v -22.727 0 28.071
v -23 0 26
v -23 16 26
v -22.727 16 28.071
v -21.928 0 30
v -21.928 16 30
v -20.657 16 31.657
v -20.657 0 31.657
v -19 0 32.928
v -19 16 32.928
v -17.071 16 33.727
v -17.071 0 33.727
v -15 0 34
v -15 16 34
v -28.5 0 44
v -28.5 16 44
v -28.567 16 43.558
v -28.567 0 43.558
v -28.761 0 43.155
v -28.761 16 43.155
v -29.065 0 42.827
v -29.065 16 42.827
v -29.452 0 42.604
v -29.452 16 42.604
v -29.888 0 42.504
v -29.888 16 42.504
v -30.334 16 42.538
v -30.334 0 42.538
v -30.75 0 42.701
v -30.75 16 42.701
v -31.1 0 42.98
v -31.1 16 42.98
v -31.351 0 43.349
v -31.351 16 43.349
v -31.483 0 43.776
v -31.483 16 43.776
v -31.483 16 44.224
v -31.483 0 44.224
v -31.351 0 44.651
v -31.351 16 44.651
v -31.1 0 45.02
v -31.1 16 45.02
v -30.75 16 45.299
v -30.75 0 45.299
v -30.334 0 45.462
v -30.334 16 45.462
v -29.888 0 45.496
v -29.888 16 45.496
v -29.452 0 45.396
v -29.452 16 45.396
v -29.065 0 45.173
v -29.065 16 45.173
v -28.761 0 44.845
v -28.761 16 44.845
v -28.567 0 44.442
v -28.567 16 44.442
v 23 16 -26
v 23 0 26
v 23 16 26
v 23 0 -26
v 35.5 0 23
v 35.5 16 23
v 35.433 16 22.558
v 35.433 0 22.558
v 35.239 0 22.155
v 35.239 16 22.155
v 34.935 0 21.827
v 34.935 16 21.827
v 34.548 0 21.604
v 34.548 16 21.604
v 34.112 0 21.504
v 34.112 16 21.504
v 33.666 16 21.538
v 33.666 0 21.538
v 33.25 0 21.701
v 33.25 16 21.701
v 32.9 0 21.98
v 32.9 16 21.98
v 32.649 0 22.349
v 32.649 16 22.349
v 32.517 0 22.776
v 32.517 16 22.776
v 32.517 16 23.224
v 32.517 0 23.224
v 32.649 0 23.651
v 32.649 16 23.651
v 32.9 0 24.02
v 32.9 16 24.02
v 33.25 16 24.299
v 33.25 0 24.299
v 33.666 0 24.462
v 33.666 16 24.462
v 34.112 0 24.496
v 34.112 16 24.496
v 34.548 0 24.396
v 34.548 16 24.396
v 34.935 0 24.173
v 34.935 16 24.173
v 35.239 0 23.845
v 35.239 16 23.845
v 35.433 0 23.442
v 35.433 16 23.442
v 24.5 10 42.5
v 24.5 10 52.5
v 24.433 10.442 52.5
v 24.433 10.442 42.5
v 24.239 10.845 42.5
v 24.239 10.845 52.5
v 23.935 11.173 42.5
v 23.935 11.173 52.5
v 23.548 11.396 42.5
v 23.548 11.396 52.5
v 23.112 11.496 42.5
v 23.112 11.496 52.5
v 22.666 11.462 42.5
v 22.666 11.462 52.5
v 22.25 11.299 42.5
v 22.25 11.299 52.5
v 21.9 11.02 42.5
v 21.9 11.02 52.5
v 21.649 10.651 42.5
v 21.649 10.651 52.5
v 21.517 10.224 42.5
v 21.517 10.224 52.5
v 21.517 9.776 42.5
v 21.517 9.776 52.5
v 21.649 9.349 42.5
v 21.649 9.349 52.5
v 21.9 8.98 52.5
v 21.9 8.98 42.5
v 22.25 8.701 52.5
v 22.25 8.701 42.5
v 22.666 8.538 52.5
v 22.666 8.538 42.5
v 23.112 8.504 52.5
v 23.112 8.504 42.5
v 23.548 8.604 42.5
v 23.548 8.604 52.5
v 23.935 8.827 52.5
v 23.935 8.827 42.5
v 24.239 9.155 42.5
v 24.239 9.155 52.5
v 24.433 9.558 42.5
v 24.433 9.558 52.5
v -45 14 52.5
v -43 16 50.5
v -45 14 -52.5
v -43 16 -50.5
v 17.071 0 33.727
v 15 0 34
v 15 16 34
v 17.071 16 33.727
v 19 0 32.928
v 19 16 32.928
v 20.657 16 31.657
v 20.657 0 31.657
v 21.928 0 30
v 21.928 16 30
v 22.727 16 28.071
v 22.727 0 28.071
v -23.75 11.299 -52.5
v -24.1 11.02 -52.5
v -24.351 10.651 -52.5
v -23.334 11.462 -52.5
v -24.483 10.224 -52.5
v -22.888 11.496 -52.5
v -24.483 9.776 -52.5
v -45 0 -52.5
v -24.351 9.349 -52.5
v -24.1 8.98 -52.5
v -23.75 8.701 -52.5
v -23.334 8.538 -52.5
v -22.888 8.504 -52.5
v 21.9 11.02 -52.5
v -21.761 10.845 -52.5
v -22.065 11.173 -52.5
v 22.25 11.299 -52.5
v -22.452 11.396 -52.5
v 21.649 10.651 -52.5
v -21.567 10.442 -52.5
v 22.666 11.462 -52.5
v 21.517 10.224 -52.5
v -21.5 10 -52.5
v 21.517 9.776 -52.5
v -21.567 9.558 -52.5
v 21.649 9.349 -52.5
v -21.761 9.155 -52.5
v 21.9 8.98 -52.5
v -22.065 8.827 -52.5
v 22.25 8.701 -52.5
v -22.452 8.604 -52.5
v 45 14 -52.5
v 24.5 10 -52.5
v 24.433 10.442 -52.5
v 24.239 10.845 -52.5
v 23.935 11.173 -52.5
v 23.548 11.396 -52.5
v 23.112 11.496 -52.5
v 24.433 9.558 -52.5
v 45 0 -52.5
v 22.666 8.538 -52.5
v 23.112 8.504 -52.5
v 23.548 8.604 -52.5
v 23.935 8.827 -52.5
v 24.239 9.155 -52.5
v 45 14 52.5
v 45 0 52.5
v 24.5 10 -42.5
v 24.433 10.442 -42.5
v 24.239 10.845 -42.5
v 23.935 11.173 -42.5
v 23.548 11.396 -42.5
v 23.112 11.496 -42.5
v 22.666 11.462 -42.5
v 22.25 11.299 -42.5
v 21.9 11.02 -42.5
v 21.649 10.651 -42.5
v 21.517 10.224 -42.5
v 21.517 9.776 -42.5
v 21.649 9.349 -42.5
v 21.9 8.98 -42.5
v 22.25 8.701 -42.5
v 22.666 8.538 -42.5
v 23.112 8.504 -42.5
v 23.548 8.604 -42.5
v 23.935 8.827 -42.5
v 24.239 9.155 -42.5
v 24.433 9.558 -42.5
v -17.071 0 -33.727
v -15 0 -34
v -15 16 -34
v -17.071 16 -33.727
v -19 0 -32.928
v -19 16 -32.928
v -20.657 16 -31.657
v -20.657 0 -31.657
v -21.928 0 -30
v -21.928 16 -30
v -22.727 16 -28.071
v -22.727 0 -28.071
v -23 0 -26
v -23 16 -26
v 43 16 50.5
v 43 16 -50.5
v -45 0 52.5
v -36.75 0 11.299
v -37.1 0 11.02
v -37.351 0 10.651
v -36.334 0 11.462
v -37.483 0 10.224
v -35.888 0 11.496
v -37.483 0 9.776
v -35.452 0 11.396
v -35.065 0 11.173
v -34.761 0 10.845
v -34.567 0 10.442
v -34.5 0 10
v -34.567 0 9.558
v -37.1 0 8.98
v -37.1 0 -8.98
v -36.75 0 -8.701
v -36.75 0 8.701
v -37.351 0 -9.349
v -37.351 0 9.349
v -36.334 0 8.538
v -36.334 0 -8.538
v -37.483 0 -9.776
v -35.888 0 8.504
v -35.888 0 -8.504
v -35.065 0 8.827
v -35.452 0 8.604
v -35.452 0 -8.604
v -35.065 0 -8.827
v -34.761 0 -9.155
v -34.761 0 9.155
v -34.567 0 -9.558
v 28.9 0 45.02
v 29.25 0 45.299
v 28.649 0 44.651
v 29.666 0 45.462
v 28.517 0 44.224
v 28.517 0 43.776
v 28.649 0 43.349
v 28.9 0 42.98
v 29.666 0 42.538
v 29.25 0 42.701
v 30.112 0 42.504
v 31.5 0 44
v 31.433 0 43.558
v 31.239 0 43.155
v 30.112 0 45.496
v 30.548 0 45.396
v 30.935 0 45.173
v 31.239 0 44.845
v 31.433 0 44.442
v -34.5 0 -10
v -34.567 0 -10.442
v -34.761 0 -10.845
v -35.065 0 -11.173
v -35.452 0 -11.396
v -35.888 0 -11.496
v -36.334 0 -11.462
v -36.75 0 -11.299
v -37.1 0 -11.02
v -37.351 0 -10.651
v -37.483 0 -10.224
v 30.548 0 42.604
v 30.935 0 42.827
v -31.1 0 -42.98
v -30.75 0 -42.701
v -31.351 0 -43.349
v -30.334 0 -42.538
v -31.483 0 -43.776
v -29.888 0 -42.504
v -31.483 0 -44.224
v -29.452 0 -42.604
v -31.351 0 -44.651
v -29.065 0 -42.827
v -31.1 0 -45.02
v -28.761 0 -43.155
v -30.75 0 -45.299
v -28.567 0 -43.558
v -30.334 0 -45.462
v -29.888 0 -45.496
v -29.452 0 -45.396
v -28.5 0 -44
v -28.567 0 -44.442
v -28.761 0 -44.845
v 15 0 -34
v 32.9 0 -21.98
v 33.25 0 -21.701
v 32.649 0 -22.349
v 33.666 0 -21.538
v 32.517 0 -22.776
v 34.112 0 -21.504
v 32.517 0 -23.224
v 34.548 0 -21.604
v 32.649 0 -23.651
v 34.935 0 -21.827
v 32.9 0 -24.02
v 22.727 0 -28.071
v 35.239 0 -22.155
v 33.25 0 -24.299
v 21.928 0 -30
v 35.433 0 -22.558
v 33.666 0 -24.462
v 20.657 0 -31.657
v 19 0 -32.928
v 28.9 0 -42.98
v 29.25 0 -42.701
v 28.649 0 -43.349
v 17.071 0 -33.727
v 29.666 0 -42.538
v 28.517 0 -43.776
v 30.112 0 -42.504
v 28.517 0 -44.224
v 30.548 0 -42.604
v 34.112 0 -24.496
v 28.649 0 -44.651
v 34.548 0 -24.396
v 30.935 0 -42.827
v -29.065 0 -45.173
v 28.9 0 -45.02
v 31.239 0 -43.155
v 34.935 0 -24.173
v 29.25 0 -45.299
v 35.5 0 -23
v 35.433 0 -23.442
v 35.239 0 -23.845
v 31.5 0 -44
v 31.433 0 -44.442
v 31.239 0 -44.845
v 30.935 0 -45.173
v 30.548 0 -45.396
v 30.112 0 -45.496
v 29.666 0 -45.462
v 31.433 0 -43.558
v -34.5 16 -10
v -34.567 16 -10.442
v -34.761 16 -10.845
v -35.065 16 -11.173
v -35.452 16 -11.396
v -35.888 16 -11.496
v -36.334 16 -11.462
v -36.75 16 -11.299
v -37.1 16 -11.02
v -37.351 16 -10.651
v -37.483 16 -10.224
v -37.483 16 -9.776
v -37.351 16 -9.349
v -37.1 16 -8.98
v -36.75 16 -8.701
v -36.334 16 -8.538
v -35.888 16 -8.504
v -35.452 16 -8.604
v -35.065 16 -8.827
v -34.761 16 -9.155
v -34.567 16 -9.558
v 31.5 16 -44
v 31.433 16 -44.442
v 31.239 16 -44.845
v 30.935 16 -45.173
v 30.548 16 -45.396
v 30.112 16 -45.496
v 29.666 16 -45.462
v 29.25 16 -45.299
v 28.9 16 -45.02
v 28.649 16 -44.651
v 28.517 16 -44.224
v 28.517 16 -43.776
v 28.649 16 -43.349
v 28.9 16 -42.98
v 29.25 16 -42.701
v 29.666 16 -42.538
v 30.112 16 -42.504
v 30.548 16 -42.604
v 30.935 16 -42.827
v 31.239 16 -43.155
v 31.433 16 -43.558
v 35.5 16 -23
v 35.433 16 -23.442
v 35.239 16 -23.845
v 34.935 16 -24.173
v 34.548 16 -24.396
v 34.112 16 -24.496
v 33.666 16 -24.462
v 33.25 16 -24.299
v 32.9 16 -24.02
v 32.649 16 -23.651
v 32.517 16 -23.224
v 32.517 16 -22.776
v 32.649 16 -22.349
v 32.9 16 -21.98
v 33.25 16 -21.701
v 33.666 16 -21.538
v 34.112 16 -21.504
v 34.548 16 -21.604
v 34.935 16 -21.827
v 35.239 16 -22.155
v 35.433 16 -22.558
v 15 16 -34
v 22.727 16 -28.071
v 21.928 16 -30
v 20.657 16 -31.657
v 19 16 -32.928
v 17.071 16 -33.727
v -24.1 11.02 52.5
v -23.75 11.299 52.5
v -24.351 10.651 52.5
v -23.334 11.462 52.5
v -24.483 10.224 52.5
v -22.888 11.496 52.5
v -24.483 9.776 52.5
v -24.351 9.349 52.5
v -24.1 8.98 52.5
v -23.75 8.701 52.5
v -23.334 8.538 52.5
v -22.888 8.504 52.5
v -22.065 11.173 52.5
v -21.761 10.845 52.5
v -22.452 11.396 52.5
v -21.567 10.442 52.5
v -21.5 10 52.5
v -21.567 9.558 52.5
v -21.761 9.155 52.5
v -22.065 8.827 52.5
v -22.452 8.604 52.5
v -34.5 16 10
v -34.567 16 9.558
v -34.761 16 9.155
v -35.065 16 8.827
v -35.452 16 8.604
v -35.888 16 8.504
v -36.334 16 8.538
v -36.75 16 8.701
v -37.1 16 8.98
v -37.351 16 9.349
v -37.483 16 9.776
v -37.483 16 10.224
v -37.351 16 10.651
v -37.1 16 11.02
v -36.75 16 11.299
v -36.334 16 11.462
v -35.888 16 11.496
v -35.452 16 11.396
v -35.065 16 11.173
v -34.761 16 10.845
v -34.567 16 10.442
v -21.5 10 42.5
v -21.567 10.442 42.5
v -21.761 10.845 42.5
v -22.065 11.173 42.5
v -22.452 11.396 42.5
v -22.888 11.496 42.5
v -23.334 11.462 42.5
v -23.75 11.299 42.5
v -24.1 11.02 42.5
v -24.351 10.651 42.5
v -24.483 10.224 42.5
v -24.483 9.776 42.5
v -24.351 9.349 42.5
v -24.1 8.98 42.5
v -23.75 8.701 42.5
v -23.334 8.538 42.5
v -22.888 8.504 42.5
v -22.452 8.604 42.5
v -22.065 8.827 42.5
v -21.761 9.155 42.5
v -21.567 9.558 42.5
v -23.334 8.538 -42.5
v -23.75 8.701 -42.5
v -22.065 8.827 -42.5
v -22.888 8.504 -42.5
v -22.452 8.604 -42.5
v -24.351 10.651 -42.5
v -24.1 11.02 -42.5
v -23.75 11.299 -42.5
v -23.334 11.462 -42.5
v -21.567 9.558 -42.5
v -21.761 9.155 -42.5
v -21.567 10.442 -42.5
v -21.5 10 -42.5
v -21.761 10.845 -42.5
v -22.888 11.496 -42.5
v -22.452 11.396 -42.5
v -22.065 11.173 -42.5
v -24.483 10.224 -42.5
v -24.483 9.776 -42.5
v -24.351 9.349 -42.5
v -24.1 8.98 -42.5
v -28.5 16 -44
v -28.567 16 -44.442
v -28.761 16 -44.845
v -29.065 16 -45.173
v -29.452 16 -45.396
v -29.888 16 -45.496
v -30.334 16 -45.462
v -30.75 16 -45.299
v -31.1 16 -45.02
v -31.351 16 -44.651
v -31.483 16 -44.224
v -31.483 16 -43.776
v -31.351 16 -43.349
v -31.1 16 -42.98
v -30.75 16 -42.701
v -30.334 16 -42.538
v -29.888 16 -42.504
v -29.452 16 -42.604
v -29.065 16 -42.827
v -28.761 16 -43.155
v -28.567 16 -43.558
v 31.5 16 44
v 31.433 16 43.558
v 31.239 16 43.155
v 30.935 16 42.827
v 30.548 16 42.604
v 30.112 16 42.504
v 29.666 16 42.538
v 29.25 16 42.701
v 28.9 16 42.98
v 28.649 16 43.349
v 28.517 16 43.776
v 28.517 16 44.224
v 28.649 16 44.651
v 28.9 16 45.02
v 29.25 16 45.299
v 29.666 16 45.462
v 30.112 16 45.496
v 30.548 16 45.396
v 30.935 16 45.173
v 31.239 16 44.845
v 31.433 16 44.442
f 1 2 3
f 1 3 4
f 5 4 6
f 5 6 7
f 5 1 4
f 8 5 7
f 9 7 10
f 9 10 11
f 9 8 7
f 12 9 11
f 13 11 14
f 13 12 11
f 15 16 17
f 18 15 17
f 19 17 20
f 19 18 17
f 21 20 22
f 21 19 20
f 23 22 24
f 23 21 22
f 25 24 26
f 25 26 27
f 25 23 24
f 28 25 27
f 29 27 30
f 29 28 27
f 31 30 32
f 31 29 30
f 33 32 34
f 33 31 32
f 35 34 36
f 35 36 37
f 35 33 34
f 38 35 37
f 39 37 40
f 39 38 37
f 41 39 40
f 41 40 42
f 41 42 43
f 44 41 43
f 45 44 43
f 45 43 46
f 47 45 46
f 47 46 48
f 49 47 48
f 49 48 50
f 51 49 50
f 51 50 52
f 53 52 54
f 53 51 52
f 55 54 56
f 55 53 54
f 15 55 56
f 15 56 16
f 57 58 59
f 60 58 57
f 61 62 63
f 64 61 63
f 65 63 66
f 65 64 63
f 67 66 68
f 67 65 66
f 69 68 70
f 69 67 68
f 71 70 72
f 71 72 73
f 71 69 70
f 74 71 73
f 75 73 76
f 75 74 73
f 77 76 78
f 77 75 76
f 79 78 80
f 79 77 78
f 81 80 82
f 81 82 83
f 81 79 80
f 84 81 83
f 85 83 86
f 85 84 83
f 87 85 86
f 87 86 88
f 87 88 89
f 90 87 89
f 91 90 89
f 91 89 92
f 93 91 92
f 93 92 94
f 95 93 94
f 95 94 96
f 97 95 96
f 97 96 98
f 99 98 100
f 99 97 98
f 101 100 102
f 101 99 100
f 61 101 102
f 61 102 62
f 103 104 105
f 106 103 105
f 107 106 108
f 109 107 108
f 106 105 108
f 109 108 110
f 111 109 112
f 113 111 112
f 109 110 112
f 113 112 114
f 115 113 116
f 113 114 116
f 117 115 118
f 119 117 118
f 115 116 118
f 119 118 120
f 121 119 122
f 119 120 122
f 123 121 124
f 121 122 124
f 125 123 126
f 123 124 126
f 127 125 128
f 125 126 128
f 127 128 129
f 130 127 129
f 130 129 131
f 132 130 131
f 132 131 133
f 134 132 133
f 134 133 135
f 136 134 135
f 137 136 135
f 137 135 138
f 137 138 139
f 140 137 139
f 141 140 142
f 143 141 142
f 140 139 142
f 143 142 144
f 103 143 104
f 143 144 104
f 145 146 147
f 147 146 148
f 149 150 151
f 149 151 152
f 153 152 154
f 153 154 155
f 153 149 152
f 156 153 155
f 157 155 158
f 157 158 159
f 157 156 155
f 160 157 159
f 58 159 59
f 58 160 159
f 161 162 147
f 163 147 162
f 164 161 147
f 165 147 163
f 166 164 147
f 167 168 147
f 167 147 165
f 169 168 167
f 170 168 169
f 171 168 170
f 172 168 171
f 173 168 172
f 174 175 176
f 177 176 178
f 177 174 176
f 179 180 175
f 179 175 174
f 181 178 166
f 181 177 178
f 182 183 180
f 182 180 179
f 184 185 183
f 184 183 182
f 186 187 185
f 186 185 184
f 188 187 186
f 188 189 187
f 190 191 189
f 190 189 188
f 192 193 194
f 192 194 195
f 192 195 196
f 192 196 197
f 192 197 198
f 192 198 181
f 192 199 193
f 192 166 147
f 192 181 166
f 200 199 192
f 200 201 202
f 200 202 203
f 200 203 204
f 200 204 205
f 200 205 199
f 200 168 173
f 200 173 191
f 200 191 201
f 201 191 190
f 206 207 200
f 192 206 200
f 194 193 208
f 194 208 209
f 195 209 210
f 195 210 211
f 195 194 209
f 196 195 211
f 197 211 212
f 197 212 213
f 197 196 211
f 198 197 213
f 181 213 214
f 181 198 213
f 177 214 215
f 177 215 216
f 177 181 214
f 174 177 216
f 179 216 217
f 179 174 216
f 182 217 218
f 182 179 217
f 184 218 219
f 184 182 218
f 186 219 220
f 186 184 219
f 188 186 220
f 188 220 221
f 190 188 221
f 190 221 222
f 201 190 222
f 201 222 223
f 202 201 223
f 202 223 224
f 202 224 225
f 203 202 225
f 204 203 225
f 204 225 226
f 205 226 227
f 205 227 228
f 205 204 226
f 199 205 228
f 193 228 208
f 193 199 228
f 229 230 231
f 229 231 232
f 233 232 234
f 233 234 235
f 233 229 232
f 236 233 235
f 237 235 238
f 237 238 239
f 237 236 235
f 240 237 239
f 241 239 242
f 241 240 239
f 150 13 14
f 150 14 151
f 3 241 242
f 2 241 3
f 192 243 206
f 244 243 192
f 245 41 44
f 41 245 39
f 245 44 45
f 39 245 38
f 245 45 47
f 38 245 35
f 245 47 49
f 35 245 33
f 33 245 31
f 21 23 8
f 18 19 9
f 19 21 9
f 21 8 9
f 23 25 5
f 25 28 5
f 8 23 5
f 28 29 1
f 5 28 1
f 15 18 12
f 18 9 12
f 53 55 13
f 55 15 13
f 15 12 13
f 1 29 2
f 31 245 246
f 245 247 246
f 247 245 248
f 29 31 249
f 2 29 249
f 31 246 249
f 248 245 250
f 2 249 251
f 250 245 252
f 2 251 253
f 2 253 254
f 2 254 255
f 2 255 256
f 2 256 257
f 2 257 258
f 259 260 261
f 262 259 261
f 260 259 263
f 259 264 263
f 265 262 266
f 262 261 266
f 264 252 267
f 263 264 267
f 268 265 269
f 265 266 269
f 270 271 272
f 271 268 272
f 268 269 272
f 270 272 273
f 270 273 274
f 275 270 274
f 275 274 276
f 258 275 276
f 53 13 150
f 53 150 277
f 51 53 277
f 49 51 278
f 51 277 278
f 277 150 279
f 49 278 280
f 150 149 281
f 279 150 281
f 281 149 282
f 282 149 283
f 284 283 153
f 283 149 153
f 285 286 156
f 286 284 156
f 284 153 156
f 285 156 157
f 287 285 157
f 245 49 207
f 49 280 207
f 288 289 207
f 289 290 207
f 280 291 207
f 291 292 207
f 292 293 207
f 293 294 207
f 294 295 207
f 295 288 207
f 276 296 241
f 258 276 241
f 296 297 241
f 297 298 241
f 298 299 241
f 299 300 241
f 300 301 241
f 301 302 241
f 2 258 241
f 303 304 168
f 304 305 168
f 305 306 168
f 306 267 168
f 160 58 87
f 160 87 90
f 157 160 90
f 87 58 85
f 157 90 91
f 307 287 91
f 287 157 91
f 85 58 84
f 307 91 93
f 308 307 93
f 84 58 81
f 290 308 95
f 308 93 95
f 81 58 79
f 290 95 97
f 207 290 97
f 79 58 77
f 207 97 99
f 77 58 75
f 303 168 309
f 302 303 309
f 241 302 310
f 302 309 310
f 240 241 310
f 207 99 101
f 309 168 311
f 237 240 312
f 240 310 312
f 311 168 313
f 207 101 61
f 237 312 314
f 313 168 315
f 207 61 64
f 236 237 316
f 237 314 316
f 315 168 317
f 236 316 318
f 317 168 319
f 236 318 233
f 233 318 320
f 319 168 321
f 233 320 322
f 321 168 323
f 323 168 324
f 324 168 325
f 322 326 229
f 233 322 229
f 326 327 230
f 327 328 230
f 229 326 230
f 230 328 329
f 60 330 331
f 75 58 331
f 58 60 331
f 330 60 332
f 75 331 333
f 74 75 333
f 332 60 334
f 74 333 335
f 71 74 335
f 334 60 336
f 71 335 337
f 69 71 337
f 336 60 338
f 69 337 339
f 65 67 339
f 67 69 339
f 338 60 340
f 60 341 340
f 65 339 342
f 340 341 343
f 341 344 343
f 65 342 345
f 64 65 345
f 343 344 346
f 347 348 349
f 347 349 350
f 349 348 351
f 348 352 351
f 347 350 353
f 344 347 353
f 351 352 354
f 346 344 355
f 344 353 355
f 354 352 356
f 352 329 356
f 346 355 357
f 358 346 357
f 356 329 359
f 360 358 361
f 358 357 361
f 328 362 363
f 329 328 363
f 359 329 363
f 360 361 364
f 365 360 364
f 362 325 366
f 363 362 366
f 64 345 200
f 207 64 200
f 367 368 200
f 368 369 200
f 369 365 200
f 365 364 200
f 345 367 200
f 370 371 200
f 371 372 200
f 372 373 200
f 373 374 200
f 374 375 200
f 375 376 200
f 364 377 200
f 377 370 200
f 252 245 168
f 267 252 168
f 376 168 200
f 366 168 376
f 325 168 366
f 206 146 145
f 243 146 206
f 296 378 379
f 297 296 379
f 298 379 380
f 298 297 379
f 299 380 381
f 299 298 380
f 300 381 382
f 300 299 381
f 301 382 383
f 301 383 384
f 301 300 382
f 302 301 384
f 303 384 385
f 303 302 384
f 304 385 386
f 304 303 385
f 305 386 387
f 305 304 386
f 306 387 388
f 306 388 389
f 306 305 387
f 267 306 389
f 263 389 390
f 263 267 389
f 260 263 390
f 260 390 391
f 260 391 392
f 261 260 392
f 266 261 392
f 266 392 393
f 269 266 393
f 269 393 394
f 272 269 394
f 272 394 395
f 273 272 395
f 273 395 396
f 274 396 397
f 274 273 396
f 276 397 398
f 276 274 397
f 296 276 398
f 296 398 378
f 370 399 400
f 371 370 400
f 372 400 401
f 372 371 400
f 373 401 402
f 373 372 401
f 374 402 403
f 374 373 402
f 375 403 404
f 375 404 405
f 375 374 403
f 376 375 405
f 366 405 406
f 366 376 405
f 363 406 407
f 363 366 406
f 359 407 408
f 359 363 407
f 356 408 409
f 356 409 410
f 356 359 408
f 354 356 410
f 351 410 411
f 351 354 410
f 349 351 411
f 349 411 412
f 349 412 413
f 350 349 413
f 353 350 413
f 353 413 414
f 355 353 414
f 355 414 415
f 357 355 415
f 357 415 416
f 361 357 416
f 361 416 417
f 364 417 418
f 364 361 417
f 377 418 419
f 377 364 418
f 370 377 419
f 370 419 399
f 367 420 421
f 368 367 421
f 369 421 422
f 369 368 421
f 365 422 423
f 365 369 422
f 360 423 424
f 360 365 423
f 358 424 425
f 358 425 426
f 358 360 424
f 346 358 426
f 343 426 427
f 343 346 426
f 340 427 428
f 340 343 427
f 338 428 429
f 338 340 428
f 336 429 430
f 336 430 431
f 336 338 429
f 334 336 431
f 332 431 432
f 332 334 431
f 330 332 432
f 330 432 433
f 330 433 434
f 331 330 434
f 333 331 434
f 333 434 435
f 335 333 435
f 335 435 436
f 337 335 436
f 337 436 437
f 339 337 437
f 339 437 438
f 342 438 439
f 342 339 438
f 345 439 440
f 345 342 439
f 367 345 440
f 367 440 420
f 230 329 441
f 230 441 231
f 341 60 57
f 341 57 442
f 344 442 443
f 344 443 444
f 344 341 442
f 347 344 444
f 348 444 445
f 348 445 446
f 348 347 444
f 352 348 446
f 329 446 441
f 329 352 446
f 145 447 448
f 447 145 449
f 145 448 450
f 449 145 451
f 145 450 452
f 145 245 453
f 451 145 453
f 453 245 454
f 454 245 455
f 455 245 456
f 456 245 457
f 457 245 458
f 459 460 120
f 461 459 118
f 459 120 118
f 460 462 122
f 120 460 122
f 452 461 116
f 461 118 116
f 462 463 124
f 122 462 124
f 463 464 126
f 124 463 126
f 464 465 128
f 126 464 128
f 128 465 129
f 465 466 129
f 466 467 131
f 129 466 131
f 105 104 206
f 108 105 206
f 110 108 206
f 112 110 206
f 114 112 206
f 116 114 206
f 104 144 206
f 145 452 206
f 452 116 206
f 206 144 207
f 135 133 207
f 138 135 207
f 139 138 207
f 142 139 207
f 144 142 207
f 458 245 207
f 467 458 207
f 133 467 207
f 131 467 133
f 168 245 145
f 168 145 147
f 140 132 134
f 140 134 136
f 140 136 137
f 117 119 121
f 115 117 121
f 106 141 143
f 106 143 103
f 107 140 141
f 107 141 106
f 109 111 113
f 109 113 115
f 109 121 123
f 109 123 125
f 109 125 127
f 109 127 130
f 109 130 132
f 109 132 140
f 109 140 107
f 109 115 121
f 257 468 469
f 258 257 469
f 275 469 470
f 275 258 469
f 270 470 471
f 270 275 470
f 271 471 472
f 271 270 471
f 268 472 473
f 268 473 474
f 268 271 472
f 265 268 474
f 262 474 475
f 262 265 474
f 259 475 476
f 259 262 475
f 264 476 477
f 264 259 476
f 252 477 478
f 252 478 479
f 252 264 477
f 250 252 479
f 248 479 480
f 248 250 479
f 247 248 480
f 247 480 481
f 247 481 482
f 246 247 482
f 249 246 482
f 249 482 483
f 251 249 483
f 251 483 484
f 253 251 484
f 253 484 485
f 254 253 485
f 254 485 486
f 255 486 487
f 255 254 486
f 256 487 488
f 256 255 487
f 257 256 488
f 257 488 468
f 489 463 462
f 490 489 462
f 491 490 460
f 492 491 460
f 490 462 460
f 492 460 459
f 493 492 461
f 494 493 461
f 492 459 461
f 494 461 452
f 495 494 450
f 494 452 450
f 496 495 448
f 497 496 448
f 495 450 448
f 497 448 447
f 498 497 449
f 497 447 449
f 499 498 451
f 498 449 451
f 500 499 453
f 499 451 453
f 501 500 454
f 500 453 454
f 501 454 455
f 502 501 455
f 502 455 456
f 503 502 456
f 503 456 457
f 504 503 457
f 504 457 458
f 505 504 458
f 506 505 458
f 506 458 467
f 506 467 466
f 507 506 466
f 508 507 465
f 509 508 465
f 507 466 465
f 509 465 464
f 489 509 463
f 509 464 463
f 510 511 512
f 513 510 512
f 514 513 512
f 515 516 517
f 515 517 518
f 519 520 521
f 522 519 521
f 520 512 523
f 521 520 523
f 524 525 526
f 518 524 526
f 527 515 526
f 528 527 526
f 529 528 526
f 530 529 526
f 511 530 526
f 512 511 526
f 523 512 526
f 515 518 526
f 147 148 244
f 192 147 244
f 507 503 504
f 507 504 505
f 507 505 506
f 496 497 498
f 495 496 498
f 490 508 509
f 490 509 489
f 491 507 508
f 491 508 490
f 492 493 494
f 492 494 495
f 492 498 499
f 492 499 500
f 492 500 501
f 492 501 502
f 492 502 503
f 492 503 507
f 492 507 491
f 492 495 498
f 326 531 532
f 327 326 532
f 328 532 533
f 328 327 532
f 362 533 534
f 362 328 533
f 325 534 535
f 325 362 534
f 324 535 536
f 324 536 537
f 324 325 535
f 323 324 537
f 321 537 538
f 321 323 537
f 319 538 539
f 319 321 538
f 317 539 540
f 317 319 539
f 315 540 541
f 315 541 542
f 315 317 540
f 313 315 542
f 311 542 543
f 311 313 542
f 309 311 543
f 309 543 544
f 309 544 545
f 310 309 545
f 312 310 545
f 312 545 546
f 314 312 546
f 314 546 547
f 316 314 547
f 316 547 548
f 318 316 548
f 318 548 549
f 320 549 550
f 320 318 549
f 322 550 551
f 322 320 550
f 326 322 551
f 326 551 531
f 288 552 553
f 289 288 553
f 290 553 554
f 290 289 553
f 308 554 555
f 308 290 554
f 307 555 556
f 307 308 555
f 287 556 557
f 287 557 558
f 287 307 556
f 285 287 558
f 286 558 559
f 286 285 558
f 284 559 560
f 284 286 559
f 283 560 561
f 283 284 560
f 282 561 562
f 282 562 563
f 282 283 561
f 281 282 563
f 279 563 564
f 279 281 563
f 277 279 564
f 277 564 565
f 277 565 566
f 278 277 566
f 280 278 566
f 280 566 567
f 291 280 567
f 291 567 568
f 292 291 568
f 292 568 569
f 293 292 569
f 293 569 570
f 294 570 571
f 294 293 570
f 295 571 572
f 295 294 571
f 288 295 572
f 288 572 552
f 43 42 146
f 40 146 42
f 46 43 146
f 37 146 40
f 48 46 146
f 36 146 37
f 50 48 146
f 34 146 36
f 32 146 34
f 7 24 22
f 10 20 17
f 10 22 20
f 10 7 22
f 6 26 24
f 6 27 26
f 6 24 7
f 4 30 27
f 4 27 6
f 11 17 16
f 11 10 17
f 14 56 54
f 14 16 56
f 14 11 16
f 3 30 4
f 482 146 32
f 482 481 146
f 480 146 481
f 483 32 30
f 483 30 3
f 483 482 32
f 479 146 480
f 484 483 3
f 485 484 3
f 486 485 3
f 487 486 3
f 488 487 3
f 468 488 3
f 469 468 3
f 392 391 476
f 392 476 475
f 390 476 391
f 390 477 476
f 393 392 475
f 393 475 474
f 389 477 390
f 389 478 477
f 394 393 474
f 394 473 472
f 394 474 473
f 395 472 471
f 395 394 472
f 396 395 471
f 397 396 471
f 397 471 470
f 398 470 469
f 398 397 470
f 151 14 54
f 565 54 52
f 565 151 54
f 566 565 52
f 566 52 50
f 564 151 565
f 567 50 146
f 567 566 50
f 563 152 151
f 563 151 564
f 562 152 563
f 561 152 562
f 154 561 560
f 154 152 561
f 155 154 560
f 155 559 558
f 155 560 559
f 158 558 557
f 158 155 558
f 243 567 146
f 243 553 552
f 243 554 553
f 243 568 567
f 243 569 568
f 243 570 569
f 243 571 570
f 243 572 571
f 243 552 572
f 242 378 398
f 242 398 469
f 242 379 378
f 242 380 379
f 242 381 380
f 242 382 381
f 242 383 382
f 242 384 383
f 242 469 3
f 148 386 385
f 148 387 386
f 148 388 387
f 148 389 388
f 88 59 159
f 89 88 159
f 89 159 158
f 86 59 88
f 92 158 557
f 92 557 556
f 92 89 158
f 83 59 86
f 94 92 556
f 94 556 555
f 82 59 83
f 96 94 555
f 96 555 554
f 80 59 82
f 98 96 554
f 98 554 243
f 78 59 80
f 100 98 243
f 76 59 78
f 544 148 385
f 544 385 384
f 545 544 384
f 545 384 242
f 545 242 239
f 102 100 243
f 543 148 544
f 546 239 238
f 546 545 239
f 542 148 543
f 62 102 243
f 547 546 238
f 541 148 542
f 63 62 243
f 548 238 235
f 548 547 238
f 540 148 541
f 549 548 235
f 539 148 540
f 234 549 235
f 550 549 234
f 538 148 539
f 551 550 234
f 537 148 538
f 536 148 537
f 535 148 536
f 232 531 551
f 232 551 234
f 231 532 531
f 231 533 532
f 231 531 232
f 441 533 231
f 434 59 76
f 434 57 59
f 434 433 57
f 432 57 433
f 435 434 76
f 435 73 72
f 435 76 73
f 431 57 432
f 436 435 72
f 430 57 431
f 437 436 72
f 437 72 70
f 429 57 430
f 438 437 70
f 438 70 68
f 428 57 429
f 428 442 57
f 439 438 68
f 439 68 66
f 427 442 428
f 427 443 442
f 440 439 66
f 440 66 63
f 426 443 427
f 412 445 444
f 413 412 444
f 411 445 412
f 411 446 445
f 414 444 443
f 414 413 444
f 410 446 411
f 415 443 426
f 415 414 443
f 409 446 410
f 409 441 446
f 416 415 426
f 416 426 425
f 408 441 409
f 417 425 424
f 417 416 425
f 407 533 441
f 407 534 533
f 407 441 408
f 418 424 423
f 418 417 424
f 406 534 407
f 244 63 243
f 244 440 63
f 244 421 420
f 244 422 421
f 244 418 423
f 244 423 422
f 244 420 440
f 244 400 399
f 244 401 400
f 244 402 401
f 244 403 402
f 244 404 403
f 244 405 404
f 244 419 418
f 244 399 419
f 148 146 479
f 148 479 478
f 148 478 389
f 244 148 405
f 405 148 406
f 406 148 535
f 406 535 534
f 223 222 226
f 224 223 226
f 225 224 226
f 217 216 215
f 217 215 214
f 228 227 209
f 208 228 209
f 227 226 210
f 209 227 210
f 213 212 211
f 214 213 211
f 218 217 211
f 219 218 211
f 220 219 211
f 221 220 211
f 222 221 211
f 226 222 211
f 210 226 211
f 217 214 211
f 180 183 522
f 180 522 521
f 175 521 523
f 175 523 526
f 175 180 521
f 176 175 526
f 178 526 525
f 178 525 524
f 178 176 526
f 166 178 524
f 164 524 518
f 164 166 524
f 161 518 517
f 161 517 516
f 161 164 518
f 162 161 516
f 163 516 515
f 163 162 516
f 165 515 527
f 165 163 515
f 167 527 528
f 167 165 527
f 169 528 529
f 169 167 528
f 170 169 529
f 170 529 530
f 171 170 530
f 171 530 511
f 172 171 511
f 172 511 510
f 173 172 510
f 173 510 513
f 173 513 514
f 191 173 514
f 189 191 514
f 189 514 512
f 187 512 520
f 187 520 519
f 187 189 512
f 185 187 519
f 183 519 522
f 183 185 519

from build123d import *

# Parameters (mm, degrees)
SKETCH1_W           = 90
SKETCH1_H           = 105
SKETCH1_R           = 1.5
BOSS_EXTRUDE1_DEPTH = 16
CHAMFER1_SIZE       = 2
SKETCH2_R           = 1.5
CUT_EXTRUDE1_DEPTH  = 10


with BuildPart() as part:
    # Sketch1 → Boss-Extrude1 (new body)
    with BuildSketch(Plane(origin=(0, 0, 0), x_dir=(1, 0, 0), z_dir=(0, 1, 0))):
        Rectangle(SKETCH1_W, SKETCH1_H)
        with Locations((-30, 44)):
            Circle(SKETCH1_R, mode=Mode.SUBTRACT)
        with Locations((30, 44)):
            Circle(SKETCH1_R, mode=Mode.SUBTRACT)
        with Locations((30, -44)):
            Circle(SKETCH1_R, mode=Mode.SUBTRACT)
        with Locations((-30, -44)):
            Circle(SKETCH1_R, mode=Mode.SUBTRACT)
        with Locations((-36, -10)):
            Circle(SKETCH1_R, mode=Mode.SUBTRACT)
        with Locations((-36, 10)):
            Circle(SKETCH1_R, mode=Mode.SUBTRACT)
        with Locations((34, 23)):
            Circle(SKETCH1_R, mode=Mode.SUBTRACT)
        with Locations((34, -23)):
            Circle(SKETCH1_R, mode=Mode.SUBTRACT)
        with BuildLine():
            Line((-15, -34), (15, -34))
            ThreePointArc((15, -34), (20.656854249, -31.656854249), (23, -26))
            Line((23, -26), (23, 26))
            ThreePointArc((23, 26), (20.656854249, 31.656854249), (15, 34))
            Line((15, 34), (-15, 34))
            ThreePointArc((-15, 34), (-20.656854249, 31.656854249), (-23, 26))
            Line((-23, 26), (-23, -26))
            ThreePointArc((-23, -26), (-20.656854249, -31.656854249), (-15, -34))
        make_face(mode=Mode.SUBTRACT)
    extrude(amount=BOSS_EXTRUDE1_DEPTH)

    # Chamfer1
    chamfer1_edges = [part.edges().sort_by_distance(p)[0] for p in [
        (-45, 16, 0),
        (0, 16, 52.5),
        (45, 16, 0),
        (0, 16, -52.5),
    ]]
    chamfer(chamfer1_edges, length=CHAMFER1_SIZE)

    # Sketch2 → Cut-Extrude1 (cut)
    with BuildSketch(Plane.XY.offset(52.5)):
        with Locations((-23, 10)):
            Circle(SKETCH2_R)
        with Locations((23, 10)):
            Circle(SKETCH2_R)
    cut_extrude1 = extrude(amount=-CUT_EXTRUDE1_DEPTH, mode=Mode.SUBTRACT)

    # Mirror1: Cut-Extrude1 across plane
    add(cut_extrude1.mirror(Plane.XY), mode=Mode.SUBTRACT)


solid = part.part
